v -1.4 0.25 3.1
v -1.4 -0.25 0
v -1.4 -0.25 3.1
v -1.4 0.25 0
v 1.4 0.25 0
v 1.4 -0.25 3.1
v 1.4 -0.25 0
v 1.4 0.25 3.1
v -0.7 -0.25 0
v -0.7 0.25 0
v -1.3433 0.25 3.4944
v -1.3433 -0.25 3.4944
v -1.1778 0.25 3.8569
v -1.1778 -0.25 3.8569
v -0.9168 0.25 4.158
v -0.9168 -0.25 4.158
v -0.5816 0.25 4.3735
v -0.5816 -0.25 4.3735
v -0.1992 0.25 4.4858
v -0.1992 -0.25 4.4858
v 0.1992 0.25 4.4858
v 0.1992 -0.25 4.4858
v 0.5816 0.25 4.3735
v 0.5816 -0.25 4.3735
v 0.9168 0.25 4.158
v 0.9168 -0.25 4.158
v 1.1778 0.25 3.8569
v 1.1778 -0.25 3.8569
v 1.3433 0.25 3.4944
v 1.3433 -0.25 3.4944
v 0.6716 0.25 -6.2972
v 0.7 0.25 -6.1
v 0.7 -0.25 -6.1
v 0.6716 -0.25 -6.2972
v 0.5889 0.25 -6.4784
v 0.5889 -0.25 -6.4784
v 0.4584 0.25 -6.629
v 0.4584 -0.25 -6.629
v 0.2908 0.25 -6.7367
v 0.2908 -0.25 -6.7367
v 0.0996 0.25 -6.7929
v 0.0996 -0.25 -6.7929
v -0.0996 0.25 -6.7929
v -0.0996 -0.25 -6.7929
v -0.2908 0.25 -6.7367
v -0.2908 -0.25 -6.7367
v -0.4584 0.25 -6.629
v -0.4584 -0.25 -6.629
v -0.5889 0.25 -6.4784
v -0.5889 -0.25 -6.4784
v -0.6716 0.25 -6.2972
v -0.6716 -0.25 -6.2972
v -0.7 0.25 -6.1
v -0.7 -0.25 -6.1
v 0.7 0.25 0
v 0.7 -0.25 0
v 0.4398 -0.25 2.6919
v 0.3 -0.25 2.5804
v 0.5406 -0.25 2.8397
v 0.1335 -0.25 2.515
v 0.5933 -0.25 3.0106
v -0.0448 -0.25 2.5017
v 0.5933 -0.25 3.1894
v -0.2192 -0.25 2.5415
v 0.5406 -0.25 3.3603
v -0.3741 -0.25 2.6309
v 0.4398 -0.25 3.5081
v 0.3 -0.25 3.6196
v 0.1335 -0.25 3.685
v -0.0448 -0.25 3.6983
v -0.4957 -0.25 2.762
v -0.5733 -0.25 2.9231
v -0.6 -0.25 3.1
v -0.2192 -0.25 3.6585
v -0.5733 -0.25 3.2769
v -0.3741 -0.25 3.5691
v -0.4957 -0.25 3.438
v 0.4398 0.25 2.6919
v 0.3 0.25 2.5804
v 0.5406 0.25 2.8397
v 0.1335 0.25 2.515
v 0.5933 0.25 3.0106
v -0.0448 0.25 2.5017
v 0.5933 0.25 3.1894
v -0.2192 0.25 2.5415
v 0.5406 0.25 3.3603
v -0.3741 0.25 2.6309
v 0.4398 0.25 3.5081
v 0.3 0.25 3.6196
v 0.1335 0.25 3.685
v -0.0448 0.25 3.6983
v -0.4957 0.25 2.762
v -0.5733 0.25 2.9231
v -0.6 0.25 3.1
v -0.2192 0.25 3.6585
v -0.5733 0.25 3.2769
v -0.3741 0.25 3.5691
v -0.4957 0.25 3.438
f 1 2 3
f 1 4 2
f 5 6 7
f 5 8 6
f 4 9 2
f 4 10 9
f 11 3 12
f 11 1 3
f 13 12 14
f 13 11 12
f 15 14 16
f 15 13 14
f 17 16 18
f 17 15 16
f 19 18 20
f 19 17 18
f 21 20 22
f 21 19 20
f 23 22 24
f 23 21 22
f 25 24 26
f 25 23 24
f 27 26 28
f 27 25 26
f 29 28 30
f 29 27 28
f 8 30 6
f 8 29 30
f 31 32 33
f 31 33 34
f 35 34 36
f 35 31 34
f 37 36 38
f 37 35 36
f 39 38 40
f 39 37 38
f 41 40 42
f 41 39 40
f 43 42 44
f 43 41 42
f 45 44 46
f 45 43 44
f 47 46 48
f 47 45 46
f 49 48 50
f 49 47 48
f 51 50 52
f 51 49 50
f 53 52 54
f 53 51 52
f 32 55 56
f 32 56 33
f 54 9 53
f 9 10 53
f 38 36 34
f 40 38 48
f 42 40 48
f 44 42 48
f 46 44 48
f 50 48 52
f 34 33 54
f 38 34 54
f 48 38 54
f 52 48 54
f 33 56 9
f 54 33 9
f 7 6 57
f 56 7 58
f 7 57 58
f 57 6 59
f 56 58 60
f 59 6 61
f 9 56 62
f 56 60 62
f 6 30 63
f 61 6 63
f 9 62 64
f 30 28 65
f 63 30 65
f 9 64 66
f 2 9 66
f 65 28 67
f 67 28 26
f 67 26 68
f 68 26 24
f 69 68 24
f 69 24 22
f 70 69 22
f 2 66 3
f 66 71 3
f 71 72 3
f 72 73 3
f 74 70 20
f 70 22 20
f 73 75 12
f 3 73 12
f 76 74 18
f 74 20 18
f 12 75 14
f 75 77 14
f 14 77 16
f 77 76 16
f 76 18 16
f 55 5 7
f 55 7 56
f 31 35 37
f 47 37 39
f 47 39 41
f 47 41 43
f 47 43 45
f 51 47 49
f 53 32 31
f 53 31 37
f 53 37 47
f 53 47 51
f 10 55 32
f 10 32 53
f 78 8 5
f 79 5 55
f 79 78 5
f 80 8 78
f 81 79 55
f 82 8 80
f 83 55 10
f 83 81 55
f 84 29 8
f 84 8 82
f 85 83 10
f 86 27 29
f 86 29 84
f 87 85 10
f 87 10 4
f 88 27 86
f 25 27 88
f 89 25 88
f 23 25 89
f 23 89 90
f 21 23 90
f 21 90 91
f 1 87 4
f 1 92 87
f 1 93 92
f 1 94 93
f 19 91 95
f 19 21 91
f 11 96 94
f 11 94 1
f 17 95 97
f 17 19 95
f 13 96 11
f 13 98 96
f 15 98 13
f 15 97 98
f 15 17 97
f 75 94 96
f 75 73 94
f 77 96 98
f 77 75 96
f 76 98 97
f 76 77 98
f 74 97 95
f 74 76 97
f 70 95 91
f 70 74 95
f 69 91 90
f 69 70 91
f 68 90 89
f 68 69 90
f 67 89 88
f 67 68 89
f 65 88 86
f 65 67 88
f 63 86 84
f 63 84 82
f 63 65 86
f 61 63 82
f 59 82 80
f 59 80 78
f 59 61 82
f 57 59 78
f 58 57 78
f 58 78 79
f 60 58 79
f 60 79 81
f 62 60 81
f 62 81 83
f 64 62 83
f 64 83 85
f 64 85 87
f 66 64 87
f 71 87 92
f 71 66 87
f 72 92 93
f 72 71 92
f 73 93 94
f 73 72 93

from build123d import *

# Parameters (mm, degrees)
SKETCH_R  = 0.6
PAD_DEPTH = 0.25


with BuildPart() as part:
    # Sketch → Pad (new body, symmetric)
    with BuildSketch(Plane(origin=(0, 0, 0), x_dir=(-1, 0, 0), z_dir=(0, 1, 0))):
        with BuildLine():
            Line((-1.4, 3.1), (-1.4, 0))
            Line((-1.4, 0), (-0.7, 0))
            Line((-0.7, 0), (-0.7, -6.1))
            ThreePointArc((-0.7, -6.1), (0, -6.8), (0.7, -6.1))
            Line((0.7, 0), (0.7, -6.1))
            Line((0.7, 0), (1.4, 0))
            Line((1.4, 0), (1.4, 3.1))
            ThreePointArc((1.4, 3.1), (0, 4.5), (-1.4, 3.1))
        make_face()
        with Locations((0, 3.1)):
            Circle(SKETCH_R, mode=Mode.SUBTRACT)
    extrude(amount=PAD_DEPTH, both=True)


solid = part.part
